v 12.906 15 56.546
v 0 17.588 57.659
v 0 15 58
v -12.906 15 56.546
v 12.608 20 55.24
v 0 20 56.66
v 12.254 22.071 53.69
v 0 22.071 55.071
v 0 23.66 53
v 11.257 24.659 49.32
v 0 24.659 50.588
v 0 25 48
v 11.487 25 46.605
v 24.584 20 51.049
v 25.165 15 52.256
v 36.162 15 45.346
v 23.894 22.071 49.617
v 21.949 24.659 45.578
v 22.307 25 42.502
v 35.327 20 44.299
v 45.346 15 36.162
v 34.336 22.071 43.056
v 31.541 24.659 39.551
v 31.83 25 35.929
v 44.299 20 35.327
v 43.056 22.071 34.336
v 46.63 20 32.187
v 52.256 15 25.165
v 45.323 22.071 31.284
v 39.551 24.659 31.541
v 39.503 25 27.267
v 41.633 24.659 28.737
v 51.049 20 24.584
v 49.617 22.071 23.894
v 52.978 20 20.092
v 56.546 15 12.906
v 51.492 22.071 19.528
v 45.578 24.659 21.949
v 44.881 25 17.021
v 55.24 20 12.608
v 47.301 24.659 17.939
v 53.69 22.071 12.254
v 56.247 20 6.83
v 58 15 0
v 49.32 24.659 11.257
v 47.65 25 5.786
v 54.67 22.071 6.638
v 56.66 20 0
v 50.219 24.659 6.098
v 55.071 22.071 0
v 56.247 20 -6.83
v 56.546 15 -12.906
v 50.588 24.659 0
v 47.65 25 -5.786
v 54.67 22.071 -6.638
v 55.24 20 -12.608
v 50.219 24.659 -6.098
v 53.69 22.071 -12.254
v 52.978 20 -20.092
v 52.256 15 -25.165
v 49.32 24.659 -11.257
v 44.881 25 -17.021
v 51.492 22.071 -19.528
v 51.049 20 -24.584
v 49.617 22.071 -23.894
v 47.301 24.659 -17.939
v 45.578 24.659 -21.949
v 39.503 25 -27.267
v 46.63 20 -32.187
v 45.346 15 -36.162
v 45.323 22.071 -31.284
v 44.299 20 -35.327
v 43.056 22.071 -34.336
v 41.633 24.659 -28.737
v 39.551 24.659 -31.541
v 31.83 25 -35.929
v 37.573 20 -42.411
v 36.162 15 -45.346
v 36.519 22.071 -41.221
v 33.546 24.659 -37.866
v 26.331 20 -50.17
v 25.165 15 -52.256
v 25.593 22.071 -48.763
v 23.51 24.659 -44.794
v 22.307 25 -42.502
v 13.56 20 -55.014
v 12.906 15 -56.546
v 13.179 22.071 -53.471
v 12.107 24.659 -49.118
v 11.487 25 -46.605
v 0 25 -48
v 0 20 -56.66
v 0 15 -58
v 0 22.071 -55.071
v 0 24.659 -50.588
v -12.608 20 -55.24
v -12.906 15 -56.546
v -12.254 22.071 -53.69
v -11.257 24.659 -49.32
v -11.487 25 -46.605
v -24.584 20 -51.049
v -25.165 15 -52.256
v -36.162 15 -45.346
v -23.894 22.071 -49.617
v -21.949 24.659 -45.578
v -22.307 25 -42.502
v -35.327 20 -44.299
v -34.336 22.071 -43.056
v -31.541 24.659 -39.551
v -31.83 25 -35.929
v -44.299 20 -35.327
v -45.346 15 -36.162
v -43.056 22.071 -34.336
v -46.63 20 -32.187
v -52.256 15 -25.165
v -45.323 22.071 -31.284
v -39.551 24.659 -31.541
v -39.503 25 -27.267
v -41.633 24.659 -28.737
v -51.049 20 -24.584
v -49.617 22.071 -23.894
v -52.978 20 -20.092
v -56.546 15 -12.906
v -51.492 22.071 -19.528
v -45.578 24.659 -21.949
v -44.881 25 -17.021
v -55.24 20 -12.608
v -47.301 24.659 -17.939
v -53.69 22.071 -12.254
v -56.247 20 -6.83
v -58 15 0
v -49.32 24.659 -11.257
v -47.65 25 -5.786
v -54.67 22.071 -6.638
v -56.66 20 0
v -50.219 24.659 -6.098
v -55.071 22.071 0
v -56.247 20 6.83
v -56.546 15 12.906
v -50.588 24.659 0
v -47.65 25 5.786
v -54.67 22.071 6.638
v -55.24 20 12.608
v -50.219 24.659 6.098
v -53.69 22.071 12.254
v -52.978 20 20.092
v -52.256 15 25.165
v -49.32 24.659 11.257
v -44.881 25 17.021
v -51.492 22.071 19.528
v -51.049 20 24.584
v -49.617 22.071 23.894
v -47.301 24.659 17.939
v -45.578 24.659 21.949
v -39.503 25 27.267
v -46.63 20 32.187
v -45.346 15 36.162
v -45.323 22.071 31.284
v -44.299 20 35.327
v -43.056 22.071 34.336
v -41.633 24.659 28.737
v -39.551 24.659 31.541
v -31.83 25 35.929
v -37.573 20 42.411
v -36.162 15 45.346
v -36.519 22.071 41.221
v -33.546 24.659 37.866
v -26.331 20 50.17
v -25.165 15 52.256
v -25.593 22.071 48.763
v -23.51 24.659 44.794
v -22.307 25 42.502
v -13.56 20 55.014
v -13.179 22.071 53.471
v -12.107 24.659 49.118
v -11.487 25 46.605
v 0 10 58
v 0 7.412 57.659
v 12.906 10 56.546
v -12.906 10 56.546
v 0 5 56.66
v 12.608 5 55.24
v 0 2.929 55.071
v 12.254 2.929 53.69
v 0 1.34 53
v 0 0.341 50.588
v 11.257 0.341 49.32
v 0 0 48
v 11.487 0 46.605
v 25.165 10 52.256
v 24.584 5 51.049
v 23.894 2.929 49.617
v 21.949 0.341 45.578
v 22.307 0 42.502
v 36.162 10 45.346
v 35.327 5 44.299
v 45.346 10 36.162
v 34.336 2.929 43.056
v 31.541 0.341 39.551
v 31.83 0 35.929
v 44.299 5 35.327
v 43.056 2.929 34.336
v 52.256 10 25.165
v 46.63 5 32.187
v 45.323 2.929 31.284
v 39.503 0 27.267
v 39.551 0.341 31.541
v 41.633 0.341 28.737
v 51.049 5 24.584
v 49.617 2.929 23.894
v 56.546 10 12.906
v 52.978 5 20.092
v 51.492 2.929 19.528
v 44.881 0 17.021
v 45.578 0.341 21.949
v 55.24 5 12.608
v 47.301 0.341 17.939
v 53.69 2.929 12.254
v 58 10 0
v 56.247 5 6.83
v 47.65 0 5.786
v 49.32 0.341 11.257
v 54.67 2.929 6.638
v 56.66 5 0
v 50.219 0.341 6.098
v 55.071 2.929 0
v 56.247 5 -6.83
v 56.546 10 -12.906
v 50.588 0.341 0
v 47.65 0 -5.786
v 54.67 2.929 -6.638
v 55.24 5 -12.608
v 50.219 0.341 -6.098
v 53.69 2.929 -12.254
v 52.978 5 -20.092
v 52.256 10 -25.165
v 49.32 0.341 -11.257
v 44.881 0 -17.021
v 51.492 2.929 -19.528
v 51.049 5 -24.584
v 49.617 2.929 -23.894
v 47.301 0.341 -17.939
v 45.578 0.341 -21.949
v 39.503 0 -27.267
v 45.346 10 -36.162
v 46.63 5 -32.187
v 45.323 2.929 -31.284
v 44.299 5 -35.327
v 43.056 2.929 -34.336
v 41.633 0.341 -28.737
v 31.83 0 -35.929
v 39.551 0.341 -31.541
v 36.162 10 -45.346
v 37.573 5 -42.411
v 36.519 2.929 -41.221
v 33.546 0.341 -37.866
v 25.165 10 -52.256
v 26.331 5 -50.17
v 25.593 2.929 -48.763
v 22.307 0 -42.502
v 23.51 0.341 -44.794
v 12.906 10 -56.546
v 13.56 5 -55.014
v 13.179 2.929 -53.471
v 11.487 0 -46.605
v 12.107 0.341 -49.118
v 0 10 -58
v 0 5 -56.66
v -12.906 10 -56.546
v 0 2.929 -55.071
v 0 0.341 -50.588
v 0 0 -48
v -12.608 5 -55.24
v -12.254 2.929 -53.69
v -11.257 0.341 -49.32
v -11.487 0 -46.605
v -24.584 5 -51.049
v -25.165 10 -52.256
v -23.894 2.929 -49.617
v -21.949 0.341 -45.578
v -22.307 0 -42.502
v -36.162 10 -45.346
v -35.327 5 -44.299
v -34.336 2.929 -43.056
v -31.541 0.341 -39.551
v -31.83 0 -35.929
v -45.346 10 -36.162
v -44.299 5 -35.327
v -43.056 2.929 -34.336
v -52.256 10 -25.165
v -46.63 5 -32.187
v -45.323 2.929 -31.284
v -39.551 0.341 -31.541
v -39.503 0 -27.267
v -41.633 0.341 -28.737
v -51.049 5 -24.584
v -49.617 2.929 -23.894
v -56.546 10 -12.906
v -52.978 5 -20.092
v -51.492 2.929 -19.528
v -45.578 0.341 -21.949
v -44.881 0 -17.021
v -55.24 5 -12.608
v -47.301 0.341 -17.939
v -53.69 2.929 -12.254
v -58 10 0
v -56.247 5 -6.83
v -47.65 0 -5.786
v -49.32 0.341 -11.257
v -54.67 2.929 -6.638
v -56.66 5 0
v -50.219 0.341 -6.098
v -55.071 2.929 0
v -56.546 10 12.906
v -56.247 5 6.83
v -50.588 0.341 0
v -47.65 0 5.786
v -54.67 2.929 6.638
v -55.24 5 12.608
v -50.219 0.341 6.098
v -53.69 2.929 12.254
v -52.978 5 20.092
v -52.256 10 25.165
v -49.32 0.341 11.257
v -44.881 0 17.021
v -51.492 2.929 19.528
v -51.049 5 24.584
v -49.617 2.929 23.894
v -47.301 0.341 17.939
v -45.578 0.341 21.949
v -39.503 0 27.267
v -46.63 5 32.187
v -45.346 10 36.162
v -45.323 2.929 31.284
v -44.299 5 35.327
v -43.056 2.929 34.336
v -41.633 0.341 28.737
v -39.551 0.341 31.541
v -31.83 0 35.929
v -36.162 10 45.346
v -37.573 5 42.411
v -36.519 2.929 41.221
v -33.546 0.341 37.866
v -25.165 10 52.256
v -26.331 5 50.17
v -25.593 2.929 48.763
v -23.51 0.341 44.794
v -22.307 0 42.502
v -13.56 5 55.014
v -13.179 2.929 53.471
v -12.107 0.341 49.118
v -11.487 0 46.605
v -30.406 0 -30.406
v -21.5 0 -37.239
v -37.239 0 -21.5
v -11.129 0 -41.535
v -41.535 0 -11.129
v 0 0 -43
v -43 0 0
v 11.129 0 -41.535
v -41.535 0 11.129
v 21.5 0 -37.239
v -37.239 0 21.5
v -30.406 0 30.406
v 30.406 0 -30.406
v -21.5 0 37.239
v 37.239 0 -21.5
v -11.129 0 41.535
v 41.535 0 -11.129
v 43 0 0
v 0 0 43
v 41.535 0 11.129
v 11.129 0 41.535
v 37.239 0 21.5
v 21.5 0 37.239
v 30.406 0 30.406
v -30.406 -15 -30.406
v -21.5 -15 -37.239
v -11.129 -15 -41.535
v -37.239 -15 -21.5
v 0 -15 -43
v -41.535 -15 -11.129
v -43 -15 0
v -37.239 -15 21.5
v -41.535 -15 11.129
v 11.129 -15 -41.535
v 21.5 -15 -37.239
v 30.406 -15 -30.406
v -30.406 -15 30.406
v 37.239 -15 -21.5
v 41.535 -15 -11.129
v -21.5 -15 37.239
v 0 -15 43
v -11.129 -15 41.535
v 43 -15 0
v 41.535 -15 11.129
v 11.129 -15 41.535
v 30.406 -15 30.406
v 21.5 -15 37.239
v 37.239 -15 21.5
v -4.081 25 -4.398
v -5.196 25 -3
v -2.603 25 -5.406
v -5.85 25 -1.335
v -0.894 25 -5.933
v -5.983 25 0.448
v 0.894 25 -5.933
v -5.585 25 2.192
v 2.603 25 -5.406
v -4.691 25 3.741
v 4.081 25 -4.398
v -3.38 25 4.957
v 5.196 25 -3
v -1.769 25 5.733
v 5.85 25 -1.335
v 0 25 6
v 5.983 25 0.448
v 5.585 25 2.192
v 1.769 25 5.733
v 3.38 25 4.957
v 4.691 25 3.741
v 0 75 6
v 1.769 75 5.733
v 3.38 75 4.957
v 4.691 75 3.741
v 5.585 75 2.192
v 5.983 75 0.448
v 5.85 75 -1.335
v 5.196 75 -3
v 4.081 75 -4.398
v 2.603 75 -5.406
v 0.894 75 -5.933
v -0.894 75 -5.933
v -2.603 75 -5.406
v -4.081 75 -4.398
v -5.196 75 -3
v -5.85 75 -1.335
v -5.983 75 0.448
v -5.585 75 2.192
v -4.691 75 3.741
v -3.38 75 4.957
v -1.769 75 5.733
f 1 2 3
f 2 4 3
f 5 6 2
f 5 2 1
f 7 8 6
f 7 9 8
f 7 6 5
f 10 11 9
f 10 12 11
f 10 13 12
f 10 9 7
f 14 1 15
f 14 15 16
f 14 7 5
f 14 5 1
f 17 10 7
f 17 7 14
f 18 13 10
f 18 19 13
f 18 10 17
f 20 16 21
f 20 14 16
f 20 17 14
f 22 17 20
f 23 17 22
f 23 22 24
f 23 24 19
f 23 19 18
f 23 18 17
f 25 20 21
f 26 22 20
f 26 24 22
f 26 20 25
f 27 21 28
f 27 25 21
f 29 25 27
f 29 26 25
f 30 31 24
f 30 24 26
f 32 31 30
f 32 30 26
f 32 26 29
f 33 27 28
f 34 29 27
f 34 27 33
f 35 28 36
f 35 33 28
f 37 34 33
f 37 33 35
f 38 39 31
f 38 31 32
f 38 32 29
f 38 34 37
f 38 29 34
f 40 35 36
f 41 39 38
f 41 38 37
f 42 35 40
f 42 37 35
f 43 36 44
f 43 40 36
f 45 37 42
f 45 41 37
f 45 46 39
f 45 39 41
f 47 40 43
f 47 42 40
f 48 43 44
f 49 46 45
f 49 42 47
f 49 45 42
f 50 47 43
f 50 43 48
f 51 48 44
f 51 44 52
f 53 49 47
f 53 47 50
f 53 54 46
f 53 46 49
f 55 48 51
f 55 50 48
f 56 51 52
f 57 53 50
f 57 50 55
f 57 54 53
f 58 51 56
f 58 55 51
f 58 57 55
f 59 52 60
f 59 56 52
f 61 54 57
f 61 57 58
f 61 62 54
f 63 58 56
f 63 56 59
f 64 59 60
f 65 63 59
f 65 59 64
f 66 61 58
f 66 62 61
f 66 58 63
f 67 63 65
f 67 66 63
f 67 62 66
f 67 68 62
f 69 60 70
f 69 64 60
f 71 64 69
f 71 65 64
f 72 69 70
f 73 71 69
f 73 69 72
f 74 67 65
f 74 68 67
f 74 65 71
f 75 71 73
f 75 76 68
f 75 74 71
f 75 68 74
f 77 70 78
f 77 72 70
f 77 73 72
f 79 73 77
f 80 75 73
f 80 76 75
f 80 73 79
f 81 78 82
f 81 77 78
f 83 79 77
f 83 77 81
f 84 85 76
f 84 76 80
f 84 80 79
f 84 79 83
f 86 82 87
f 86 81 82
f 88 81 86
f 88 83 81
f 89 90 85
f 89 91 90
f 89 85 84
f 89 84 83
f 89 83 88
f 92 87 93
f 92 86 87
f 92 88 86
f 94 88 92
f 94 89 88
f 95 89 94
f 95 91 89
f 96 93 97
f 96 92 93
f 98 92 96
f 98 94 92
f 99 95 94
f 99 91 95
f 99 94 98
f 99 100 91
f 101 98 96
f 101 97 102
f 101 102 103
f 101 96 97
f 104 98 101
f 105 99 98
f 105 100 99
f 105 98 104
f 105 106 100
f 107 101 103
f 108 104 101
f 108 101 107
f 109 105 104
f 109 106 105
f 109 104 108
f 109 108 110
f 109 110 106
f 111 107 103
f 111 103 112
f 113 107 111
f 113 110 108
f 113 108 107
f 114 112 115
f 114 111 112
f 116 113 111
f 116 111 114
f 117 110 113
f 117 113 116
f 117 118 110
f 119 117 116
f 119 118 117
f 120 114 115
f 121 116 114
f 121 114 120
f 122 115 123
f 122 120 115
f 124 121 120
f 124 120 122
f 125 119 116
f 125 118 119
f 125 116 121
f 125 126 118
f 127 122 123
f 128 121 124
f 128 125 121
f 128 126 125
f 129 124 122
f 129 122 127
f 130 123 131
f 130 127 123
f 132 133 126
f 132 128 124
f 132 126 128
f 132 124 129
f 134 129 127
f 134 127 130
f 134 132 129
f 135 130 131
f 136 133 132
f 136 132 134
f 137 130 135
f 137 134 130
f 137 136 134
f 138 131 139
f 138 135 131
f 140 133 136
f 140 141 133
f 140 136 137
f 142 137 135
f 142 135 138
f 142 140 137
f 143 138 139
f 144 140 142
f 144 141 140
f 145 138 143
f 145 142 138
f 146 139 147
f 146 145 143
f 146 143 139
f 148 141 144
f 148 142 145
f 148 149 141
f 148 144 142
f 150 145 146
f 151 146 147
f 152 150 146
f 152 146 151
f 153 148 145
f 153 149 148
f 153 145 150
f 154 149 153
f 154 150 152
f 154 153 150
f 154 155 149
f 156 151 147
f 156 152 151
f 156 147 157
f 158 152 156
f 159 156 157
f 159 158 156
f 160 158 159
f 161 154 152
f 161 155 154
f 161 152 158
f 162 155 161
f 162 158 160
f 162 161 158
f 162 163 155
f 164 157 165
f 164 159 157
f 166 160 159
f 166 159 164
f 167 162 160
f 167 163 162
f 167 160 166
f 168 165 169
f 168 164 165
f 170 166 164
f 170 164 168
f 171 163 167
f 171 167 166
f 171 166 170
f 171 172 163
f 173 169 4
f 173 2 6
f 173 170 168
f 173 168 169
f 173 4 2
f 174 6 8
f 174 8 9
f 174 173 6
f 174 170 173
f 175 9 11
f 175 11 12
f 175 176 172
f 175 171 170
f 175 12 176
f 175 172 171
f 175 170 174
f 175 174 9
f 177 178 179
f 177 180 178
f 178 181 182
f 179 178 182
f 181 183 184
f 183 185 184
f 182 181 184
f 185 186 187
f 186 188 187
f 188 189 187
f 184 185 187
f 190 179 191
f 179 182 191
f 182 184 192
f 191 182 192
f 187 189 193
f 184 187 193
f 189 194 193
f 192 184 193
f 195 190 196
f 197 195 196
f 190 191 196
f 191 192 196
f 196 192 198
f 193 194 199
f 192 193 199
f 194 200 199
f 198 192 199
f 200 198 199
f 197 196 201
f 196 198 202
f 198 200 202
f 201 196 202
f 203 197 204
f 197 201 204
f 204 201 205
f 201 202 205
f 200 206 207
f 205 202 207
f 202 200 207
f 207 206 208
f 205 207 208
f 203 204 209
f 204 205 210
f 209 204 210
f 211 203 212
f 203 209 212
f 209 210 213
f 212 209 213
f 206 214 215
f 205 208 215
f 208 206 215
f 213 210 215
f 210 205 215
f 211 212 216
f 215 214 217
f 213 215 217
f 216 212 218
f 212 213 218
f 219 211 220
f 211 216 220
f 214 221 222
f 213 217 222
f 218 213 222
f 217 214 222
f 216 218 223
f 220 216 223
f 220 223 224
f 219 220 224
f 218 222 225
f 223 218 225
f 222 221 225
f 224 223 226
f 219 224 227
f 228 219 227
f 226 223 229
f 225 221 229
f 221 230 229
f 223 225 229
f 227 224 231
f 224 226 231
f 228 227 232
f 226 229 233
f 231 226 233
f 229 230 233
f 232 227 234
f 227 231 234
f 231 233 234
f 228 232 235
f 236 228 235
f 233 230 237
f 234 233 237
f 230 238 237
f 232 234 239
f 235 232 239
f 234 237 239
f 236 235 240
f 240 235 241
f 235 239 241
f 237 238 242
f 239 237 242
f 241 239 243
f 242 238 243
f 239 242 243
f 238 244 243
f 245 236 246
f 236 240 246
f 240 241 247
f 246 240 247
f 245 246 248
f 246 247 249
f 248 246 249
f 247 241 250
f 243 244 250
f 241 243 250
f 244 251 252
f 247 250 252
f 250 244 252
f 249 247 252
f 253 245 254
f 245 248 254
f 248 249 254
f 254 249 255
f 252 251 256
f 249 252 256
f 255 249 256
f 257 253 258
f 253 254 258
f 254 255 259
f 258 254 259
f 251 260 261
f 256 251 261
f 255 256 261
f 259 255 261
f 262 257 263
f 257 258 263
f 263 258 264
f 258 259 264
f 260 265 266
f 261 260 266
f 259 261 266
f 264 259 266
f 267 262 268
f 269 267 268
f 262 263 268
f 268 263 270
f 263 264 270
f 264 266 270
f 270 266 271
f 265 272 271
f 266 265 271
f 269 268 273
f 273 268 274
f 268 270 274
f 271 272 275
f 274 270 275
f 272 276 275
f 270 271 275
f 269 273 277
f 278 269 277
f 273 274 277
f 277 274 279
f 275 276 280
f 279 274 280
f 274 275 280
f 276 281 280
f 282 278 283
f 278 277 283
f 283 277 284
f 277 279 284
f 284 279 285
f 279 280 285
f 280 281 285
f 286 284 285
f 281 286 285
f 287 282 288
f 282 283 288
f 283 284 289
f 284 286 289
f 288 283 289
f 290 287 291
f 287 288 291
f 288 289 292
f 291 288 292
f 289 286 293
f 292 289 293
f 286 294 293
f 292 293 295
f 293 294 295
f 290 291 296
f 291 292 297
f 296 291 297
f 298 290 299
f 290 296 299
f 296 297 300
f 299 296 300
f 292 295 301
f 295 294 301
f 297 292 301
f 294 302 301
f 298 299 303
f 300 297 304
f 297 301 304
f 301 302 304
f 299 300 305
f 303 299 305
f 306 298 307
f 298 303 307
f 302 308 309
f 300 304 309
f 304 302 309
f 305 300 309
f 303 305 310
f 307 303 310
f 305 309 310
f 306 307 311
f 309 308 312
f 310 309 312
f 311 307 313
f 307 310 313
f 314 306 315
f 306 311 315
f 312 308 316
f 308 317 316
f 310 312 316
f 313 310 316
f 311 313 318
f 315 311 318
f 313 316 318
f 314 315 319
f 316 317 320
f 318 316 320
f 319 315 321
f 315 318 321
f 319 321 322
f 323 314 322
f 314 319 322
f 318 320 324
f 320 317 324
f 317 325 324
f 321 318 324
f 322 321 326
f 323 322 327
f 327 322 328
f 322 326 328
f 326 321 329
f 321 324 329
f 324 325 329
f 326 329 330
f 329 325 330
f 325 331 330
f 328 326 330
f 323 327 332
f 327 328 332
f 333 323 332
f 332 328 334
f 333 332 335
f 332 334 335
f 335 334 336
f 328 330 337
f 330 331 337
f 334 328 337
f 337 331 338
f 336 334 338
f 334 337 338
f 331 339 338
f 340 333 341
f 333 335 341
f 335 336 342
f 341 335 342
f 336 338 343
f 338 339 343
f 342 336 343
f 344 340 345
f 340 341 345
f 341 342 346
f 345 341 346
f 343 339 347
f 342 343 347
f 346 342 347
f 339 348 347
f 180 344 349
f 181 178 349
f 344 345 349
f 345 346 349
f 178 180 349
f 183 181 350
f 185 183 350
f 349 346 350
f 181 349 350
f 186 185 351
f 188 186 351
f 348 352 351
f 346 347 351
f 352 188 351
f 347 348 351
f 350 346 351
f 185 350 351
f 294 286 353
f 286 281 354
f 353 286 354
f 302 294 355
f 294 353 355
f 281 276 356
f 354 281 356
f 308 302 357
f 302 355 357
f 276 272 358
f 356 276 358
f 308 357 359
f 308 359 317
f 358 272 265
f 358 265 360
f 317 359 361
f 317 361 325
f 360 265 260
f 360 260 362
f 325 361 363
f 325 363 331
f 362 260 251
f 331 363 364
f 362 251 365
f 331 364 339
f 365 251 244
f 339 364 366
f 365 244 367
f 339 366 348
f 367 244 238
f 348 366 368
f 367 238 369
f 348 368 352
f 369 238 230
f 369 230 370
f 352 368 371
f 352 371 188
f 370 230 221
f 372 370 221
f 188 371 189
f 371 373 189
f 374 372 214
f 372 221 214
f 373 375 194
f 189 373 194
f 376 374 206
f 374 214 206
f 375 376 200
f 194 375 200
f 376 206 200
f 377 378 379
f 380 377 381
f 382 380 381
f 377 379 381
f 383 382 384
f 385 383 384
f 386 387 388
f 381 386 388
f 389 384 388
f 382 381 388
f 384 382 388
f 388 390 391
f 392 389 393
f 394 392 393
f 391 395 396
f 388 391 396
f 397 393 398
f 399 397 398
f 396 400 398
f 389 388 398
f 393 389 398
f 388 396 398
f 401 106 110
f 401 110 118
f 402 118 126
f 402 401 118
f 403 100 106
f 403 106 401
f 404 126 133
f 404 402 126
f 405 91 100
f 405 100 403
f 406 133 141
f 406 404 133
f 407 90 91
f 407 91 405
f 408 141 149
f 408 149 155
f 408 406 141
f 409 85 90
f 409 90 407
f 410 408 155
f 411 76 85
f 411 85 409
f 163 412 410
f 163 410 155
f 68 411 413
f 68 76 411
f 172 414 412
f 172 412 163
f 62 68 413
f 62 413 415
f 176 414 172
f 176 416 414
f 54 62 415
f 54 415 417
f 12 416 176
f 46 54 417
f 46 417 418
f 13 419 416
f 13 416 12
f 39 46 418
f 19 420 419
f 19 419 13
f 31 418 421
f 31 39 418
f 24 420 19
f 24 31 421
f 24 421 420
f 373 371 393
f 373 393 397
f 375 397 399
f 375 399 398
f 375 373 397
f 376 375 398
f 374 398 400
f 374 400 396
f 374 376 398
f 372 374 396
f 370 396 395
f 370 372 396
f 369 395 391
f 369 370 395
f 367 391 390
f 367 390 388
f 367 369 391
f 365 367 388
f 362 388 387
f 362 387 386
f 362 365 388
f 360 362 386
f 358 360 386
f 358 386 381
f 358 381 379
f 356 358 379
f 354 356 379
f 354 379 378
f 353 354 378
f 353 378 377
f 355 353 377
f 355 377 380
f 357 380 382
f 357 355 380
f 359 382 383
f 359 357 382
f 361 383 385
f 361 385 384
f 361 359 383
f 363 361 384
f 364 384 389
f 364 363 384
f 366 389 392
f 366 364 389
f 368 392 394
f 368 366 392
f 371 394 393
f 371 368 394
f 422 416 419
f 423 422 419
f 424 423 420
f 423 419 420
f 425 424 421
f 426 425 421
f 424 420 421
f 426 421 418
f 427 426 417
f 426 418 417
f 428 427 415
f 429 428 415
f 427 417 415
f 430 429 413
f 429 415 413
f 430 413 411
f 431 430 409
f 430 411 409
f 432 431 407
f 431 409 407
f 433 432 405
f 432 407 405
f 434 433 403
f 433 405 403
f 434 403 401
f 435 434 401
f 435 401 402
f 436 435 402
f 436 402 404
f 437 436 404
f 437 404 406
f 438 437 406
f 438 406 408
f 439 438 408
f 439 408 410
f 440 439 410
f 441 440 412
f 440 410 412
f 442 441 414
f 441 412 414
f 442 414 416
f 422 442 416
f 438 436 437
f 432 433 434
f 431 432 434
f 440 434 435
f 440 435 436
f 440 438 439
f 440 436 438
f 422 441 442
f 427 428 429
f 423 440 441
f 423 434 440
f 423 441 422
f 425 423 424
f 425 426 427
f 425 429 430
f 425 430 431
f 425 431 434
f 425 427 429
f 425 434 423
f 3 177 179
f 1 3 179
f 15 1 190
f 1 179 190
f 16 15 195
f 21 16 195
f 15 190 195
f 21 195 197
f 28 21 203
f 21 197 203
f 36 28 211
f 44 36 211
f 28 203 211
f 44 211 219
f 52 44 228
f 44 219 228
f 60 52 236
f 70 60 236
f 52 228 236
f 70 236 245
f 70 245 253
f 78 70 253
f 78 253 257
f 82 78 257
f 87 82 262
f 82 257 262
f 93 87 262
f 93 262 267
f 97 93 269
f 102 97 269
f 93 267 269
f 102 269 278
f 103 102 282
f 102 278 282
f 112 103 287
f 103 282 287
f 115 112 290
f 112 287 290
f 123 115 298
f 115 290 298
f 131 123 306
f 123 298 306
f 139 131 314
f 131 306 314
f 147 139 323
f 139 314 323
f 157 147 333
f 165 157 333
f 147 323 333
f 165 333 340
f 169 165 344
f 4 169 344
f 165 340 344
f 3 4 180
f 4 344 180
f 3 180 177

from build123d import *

# Parameters (mm, degrees)
SKETCH1_R           = 58
BOSS_EXTRUDE1_DEPTH = 25
SKETCH2_R           = 43
BOSS_EXTRUDE2_DEPTH = 15
FILLET1_R           = 10
BOSS_EXTRUDE3_START = 25
SKETCH3_R           = 6
BOSS_EXTRUDE3_DEPTH = 50


with BuildPart() as part:
    # Sketch1 → Boss-Extrude1 (new body)
    with BuildSketch(Plane(origin=(0, 0, 0), x_dir=(1, 0, 0), z_dir=(0, 1, 0))):
        with Locations(Location((0, 0, 0), (0, 0, 270))):
            Circle(SKETCH1_R)
    extrude(amount=BOSS_EXTRUDE1_DEPTH)

    # Sketch2 → Boss-Extrude2 (add)
    with BuildSketch(Plane(origin=(0, 0, 0), x_dir=(1, 0, 0), z_dir=(0, 1, 0))):
        with Locations(Location((0, 0, 0), (0, 0, 270))):
            Circle(SKETCH2_R)
    extrude(amount=-BOSS_EXTRUDE2_DEPTH)

    # Fillet1
    fillet1_edges = [part.edges().sort_by_distance(p)[0] for p in [
        (0, 0, -58),
        (0, 25, -58),
    ]]
    fillet(fillet1_edges, radius=FILLET1_R)

    # Sketch3 → Boss-Extrude3 (add)
    with BuildSketch(Plane(origin=(0, 0, 0), x_dir=(1, 0, 0), z_dir=(0, 1, 0)).offset(BOSS_EXTRUDE3_START)):
        with Locations(Location((0, 0, 0), (0, 0, 270))):
            Circle(SKETCH3_R)
    extrude(amount=BOSS_EXTRUDE3_DEPTH)


solid = part.part
